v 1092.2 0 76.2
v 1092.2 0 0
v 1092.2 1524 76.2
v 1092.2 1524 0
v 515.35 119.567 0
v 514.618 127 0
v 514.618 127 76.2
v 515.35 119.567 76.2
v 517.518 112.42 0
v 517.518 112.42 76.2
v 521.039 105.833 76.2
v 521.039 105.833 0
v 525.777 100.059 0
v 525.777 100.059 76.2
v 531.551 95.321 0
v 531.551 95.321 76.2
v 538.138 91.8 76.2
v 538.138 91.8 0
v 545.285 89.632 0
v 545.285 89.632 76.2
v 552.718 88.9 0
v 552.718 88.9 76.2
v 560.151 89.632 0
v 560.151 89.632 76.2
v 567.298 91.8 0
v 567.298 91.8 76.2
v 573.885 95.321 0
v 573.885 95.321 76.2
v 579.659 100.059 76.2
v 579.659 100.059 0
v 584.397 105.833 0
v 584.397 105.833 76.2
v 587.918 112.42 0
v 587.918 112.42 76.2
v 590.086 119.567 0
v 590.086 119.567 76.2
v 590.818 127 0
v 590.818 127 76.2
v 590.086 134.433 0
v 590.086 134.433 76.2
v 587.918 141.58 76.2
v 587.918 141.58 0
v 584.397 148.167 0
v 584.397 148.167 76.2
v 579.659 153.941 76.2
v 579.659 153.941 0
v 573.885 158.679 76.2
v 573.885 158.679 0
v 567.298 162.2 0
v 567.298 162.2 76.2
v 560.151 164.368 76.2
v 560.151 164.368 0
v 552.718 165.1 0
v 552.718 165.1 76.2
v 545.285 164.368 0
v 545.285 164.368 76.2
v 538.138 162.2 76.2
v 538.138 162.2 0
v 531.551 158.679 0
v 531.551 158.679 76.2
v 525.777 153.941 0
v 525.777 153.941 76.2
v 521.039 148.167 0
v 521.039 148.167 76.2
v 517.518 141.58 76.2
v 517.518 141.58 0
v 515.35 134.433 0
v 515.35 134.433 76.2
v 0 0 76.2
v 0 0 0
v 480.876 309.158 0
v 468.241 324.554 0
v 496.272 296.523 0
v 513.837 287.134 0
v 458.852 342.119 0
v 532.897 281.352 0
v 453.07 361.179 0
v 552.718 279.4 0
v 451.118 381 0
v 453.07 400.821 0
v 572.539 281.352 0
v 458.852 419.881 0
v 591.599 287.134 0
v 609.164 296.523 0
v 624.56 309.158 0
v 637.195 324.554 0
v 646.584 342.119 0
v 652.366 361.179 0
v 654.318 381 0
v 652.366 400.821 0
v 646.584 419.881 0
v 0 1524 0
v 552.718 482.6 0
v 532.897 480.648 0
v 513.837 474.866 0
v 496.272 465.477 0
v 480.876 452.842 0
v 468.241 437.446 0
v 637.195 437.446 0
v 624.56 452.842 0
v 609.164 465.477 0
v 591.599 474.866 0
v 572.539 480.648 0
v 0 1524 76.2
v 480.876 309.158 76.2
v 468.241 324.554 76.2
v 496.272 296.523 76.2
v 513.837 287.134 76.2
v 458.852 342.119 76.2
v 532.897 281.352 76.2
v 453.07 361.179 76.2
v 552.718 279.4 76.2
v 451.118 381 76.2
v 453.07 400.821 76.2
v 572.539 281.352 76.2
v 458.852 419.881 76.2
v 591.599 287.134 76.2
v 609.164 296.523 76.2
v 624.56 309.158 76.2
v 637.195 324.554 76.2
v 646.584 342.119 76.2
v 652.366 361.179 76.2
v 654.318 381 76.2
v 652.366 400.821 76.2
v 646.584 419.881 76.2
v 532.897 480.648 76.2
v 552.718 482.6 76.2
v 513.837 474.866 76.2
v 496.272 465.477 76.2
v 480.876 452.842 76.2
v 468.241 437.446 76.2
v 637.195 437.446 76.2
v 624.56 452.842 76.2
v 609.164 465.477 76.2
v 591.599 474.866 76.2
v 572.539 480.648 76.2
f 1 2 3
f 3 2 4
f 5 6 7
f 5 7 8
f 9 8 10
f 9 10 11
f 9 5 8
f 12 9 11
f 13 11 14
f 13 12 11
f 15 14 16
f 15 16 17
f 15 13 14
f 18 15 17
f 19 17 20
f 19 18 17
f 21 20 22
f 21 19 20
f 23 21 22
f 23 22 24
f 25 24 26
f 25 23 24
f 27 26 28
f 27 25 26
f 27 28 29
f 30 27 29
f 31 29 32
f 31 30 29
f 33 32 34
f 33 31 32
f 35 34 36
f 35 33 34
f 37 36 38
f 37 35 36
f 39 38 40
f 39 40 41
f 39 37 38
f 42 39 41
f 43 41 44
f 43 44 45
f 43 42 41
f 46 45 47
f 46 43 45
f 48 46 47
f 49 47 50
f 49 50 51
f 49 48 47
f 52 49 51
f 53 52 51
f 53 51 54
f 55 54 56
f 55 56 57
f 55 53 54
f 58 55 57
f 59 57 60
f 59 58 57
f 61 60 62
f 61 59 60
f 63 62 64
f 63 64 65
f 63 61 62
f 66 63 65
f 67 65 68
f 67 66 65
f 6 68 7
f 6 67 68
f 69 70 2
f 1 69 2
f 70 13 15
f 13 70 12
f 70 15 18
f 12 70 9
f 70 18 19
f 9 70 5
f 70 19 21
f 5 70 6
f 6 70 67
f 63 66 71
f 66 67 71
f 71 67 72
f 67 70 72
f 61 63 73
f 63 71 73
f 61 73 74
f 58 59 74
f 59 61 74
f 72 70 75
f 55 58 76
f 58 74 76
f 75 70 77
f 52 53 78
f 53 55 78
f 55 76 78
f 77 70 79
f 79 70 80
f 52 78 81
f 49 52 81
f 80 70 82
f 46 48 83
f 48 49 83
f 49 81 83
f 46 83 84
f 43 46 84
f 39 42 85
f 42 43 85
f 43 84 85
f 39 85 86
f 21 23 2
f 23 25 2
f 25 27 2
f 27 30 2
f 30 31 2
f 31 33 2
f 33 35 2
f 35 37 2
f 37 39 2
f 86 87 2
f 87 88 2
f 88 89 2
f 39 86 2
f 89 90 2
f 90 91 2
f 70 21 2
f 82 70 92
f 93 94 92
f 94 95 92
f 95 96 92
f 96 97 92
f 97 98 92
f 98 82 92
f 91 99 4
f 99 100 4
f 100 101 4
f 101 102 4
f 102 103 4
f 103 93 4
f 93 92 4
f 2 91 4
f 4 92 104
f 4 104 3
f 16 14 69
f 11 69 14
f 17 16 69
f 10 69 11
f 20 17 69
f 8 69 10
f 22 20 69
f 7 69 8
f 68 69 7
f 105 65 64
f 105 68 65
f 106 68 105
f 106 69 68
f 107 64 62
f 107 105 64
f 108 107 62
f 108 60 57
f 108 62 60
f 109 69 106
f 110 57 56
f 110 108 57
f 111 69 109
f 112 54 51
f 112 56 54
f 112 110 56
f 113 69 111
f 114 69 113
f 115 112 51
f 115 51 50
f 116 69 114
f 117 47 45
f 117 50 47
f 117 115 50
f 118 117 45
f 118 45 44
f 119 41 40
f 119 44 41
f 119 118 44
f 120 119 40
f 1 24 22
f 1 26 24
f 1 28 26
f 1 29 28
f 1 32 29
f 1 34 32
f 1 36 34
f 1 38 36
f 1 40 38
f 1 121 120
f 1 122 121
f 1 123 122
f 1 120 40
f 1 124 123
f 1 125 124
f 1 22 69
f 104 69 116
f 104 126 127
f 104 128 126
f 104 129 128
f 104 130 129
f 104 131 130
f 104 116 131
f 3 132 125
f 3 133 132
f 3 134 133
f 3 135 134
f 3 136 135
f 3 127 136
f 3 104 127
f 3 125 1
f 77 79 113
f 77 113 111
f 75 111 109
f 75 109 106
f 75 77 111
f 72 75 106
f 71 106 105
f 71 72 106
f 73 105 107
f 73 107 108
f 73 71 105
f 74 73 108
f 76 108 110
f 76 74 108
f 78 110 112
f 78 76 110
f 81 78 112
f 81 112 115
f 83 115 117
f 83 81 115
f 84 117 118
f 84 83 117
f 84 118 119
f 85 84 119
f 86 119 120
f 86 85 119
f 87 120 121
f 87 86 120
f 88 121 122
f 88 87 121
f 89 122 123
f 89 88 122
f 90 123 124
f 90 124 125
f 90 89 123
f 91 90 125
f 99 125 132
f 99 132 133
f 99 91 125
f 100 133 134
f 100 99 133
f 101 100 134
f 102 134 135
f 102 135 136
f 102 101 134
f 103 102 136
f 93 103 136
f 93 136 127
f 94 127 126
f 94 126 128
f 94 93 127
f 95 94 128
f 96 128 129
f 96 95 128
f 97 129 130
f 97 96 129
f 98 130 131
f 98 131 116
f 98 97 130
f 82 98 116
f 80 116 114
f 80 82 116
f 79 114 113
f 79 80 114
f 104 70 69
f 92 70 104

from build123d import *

# Parameters (mm, degrees)
SKETCH1_W           = 1092.2
SKETCH1_H           = 1524
SKETCH1_R           = 101.6
SKETCH1_R_2         = 38.1
BOSS_EXTRUDE1_DEPTH = 76.2


with BuildPart() as part:
    # Sketch1 → Boss-Extrude1 (new body)
    with BuildSketch(Plane.XY):
        with Locations((546.1, 762)):
            Rectangle(SKETCH1_W, SKETCH1_H)
        with Locations(Location((552.718036359, 381, 0), (0, 0, 180))):
            Circle(SKETCH1_R, mode=Mode.SUBTRACT)
        with Locations(Location((552.718036359, 127, 0), (0, 0, 180))):
            Circle(SKETCH1_R_2, mode=Mode.SUBTRACT)
    extrude(amount=BOSS_EXTRUDE1_DEPTH)


solid = part.part
